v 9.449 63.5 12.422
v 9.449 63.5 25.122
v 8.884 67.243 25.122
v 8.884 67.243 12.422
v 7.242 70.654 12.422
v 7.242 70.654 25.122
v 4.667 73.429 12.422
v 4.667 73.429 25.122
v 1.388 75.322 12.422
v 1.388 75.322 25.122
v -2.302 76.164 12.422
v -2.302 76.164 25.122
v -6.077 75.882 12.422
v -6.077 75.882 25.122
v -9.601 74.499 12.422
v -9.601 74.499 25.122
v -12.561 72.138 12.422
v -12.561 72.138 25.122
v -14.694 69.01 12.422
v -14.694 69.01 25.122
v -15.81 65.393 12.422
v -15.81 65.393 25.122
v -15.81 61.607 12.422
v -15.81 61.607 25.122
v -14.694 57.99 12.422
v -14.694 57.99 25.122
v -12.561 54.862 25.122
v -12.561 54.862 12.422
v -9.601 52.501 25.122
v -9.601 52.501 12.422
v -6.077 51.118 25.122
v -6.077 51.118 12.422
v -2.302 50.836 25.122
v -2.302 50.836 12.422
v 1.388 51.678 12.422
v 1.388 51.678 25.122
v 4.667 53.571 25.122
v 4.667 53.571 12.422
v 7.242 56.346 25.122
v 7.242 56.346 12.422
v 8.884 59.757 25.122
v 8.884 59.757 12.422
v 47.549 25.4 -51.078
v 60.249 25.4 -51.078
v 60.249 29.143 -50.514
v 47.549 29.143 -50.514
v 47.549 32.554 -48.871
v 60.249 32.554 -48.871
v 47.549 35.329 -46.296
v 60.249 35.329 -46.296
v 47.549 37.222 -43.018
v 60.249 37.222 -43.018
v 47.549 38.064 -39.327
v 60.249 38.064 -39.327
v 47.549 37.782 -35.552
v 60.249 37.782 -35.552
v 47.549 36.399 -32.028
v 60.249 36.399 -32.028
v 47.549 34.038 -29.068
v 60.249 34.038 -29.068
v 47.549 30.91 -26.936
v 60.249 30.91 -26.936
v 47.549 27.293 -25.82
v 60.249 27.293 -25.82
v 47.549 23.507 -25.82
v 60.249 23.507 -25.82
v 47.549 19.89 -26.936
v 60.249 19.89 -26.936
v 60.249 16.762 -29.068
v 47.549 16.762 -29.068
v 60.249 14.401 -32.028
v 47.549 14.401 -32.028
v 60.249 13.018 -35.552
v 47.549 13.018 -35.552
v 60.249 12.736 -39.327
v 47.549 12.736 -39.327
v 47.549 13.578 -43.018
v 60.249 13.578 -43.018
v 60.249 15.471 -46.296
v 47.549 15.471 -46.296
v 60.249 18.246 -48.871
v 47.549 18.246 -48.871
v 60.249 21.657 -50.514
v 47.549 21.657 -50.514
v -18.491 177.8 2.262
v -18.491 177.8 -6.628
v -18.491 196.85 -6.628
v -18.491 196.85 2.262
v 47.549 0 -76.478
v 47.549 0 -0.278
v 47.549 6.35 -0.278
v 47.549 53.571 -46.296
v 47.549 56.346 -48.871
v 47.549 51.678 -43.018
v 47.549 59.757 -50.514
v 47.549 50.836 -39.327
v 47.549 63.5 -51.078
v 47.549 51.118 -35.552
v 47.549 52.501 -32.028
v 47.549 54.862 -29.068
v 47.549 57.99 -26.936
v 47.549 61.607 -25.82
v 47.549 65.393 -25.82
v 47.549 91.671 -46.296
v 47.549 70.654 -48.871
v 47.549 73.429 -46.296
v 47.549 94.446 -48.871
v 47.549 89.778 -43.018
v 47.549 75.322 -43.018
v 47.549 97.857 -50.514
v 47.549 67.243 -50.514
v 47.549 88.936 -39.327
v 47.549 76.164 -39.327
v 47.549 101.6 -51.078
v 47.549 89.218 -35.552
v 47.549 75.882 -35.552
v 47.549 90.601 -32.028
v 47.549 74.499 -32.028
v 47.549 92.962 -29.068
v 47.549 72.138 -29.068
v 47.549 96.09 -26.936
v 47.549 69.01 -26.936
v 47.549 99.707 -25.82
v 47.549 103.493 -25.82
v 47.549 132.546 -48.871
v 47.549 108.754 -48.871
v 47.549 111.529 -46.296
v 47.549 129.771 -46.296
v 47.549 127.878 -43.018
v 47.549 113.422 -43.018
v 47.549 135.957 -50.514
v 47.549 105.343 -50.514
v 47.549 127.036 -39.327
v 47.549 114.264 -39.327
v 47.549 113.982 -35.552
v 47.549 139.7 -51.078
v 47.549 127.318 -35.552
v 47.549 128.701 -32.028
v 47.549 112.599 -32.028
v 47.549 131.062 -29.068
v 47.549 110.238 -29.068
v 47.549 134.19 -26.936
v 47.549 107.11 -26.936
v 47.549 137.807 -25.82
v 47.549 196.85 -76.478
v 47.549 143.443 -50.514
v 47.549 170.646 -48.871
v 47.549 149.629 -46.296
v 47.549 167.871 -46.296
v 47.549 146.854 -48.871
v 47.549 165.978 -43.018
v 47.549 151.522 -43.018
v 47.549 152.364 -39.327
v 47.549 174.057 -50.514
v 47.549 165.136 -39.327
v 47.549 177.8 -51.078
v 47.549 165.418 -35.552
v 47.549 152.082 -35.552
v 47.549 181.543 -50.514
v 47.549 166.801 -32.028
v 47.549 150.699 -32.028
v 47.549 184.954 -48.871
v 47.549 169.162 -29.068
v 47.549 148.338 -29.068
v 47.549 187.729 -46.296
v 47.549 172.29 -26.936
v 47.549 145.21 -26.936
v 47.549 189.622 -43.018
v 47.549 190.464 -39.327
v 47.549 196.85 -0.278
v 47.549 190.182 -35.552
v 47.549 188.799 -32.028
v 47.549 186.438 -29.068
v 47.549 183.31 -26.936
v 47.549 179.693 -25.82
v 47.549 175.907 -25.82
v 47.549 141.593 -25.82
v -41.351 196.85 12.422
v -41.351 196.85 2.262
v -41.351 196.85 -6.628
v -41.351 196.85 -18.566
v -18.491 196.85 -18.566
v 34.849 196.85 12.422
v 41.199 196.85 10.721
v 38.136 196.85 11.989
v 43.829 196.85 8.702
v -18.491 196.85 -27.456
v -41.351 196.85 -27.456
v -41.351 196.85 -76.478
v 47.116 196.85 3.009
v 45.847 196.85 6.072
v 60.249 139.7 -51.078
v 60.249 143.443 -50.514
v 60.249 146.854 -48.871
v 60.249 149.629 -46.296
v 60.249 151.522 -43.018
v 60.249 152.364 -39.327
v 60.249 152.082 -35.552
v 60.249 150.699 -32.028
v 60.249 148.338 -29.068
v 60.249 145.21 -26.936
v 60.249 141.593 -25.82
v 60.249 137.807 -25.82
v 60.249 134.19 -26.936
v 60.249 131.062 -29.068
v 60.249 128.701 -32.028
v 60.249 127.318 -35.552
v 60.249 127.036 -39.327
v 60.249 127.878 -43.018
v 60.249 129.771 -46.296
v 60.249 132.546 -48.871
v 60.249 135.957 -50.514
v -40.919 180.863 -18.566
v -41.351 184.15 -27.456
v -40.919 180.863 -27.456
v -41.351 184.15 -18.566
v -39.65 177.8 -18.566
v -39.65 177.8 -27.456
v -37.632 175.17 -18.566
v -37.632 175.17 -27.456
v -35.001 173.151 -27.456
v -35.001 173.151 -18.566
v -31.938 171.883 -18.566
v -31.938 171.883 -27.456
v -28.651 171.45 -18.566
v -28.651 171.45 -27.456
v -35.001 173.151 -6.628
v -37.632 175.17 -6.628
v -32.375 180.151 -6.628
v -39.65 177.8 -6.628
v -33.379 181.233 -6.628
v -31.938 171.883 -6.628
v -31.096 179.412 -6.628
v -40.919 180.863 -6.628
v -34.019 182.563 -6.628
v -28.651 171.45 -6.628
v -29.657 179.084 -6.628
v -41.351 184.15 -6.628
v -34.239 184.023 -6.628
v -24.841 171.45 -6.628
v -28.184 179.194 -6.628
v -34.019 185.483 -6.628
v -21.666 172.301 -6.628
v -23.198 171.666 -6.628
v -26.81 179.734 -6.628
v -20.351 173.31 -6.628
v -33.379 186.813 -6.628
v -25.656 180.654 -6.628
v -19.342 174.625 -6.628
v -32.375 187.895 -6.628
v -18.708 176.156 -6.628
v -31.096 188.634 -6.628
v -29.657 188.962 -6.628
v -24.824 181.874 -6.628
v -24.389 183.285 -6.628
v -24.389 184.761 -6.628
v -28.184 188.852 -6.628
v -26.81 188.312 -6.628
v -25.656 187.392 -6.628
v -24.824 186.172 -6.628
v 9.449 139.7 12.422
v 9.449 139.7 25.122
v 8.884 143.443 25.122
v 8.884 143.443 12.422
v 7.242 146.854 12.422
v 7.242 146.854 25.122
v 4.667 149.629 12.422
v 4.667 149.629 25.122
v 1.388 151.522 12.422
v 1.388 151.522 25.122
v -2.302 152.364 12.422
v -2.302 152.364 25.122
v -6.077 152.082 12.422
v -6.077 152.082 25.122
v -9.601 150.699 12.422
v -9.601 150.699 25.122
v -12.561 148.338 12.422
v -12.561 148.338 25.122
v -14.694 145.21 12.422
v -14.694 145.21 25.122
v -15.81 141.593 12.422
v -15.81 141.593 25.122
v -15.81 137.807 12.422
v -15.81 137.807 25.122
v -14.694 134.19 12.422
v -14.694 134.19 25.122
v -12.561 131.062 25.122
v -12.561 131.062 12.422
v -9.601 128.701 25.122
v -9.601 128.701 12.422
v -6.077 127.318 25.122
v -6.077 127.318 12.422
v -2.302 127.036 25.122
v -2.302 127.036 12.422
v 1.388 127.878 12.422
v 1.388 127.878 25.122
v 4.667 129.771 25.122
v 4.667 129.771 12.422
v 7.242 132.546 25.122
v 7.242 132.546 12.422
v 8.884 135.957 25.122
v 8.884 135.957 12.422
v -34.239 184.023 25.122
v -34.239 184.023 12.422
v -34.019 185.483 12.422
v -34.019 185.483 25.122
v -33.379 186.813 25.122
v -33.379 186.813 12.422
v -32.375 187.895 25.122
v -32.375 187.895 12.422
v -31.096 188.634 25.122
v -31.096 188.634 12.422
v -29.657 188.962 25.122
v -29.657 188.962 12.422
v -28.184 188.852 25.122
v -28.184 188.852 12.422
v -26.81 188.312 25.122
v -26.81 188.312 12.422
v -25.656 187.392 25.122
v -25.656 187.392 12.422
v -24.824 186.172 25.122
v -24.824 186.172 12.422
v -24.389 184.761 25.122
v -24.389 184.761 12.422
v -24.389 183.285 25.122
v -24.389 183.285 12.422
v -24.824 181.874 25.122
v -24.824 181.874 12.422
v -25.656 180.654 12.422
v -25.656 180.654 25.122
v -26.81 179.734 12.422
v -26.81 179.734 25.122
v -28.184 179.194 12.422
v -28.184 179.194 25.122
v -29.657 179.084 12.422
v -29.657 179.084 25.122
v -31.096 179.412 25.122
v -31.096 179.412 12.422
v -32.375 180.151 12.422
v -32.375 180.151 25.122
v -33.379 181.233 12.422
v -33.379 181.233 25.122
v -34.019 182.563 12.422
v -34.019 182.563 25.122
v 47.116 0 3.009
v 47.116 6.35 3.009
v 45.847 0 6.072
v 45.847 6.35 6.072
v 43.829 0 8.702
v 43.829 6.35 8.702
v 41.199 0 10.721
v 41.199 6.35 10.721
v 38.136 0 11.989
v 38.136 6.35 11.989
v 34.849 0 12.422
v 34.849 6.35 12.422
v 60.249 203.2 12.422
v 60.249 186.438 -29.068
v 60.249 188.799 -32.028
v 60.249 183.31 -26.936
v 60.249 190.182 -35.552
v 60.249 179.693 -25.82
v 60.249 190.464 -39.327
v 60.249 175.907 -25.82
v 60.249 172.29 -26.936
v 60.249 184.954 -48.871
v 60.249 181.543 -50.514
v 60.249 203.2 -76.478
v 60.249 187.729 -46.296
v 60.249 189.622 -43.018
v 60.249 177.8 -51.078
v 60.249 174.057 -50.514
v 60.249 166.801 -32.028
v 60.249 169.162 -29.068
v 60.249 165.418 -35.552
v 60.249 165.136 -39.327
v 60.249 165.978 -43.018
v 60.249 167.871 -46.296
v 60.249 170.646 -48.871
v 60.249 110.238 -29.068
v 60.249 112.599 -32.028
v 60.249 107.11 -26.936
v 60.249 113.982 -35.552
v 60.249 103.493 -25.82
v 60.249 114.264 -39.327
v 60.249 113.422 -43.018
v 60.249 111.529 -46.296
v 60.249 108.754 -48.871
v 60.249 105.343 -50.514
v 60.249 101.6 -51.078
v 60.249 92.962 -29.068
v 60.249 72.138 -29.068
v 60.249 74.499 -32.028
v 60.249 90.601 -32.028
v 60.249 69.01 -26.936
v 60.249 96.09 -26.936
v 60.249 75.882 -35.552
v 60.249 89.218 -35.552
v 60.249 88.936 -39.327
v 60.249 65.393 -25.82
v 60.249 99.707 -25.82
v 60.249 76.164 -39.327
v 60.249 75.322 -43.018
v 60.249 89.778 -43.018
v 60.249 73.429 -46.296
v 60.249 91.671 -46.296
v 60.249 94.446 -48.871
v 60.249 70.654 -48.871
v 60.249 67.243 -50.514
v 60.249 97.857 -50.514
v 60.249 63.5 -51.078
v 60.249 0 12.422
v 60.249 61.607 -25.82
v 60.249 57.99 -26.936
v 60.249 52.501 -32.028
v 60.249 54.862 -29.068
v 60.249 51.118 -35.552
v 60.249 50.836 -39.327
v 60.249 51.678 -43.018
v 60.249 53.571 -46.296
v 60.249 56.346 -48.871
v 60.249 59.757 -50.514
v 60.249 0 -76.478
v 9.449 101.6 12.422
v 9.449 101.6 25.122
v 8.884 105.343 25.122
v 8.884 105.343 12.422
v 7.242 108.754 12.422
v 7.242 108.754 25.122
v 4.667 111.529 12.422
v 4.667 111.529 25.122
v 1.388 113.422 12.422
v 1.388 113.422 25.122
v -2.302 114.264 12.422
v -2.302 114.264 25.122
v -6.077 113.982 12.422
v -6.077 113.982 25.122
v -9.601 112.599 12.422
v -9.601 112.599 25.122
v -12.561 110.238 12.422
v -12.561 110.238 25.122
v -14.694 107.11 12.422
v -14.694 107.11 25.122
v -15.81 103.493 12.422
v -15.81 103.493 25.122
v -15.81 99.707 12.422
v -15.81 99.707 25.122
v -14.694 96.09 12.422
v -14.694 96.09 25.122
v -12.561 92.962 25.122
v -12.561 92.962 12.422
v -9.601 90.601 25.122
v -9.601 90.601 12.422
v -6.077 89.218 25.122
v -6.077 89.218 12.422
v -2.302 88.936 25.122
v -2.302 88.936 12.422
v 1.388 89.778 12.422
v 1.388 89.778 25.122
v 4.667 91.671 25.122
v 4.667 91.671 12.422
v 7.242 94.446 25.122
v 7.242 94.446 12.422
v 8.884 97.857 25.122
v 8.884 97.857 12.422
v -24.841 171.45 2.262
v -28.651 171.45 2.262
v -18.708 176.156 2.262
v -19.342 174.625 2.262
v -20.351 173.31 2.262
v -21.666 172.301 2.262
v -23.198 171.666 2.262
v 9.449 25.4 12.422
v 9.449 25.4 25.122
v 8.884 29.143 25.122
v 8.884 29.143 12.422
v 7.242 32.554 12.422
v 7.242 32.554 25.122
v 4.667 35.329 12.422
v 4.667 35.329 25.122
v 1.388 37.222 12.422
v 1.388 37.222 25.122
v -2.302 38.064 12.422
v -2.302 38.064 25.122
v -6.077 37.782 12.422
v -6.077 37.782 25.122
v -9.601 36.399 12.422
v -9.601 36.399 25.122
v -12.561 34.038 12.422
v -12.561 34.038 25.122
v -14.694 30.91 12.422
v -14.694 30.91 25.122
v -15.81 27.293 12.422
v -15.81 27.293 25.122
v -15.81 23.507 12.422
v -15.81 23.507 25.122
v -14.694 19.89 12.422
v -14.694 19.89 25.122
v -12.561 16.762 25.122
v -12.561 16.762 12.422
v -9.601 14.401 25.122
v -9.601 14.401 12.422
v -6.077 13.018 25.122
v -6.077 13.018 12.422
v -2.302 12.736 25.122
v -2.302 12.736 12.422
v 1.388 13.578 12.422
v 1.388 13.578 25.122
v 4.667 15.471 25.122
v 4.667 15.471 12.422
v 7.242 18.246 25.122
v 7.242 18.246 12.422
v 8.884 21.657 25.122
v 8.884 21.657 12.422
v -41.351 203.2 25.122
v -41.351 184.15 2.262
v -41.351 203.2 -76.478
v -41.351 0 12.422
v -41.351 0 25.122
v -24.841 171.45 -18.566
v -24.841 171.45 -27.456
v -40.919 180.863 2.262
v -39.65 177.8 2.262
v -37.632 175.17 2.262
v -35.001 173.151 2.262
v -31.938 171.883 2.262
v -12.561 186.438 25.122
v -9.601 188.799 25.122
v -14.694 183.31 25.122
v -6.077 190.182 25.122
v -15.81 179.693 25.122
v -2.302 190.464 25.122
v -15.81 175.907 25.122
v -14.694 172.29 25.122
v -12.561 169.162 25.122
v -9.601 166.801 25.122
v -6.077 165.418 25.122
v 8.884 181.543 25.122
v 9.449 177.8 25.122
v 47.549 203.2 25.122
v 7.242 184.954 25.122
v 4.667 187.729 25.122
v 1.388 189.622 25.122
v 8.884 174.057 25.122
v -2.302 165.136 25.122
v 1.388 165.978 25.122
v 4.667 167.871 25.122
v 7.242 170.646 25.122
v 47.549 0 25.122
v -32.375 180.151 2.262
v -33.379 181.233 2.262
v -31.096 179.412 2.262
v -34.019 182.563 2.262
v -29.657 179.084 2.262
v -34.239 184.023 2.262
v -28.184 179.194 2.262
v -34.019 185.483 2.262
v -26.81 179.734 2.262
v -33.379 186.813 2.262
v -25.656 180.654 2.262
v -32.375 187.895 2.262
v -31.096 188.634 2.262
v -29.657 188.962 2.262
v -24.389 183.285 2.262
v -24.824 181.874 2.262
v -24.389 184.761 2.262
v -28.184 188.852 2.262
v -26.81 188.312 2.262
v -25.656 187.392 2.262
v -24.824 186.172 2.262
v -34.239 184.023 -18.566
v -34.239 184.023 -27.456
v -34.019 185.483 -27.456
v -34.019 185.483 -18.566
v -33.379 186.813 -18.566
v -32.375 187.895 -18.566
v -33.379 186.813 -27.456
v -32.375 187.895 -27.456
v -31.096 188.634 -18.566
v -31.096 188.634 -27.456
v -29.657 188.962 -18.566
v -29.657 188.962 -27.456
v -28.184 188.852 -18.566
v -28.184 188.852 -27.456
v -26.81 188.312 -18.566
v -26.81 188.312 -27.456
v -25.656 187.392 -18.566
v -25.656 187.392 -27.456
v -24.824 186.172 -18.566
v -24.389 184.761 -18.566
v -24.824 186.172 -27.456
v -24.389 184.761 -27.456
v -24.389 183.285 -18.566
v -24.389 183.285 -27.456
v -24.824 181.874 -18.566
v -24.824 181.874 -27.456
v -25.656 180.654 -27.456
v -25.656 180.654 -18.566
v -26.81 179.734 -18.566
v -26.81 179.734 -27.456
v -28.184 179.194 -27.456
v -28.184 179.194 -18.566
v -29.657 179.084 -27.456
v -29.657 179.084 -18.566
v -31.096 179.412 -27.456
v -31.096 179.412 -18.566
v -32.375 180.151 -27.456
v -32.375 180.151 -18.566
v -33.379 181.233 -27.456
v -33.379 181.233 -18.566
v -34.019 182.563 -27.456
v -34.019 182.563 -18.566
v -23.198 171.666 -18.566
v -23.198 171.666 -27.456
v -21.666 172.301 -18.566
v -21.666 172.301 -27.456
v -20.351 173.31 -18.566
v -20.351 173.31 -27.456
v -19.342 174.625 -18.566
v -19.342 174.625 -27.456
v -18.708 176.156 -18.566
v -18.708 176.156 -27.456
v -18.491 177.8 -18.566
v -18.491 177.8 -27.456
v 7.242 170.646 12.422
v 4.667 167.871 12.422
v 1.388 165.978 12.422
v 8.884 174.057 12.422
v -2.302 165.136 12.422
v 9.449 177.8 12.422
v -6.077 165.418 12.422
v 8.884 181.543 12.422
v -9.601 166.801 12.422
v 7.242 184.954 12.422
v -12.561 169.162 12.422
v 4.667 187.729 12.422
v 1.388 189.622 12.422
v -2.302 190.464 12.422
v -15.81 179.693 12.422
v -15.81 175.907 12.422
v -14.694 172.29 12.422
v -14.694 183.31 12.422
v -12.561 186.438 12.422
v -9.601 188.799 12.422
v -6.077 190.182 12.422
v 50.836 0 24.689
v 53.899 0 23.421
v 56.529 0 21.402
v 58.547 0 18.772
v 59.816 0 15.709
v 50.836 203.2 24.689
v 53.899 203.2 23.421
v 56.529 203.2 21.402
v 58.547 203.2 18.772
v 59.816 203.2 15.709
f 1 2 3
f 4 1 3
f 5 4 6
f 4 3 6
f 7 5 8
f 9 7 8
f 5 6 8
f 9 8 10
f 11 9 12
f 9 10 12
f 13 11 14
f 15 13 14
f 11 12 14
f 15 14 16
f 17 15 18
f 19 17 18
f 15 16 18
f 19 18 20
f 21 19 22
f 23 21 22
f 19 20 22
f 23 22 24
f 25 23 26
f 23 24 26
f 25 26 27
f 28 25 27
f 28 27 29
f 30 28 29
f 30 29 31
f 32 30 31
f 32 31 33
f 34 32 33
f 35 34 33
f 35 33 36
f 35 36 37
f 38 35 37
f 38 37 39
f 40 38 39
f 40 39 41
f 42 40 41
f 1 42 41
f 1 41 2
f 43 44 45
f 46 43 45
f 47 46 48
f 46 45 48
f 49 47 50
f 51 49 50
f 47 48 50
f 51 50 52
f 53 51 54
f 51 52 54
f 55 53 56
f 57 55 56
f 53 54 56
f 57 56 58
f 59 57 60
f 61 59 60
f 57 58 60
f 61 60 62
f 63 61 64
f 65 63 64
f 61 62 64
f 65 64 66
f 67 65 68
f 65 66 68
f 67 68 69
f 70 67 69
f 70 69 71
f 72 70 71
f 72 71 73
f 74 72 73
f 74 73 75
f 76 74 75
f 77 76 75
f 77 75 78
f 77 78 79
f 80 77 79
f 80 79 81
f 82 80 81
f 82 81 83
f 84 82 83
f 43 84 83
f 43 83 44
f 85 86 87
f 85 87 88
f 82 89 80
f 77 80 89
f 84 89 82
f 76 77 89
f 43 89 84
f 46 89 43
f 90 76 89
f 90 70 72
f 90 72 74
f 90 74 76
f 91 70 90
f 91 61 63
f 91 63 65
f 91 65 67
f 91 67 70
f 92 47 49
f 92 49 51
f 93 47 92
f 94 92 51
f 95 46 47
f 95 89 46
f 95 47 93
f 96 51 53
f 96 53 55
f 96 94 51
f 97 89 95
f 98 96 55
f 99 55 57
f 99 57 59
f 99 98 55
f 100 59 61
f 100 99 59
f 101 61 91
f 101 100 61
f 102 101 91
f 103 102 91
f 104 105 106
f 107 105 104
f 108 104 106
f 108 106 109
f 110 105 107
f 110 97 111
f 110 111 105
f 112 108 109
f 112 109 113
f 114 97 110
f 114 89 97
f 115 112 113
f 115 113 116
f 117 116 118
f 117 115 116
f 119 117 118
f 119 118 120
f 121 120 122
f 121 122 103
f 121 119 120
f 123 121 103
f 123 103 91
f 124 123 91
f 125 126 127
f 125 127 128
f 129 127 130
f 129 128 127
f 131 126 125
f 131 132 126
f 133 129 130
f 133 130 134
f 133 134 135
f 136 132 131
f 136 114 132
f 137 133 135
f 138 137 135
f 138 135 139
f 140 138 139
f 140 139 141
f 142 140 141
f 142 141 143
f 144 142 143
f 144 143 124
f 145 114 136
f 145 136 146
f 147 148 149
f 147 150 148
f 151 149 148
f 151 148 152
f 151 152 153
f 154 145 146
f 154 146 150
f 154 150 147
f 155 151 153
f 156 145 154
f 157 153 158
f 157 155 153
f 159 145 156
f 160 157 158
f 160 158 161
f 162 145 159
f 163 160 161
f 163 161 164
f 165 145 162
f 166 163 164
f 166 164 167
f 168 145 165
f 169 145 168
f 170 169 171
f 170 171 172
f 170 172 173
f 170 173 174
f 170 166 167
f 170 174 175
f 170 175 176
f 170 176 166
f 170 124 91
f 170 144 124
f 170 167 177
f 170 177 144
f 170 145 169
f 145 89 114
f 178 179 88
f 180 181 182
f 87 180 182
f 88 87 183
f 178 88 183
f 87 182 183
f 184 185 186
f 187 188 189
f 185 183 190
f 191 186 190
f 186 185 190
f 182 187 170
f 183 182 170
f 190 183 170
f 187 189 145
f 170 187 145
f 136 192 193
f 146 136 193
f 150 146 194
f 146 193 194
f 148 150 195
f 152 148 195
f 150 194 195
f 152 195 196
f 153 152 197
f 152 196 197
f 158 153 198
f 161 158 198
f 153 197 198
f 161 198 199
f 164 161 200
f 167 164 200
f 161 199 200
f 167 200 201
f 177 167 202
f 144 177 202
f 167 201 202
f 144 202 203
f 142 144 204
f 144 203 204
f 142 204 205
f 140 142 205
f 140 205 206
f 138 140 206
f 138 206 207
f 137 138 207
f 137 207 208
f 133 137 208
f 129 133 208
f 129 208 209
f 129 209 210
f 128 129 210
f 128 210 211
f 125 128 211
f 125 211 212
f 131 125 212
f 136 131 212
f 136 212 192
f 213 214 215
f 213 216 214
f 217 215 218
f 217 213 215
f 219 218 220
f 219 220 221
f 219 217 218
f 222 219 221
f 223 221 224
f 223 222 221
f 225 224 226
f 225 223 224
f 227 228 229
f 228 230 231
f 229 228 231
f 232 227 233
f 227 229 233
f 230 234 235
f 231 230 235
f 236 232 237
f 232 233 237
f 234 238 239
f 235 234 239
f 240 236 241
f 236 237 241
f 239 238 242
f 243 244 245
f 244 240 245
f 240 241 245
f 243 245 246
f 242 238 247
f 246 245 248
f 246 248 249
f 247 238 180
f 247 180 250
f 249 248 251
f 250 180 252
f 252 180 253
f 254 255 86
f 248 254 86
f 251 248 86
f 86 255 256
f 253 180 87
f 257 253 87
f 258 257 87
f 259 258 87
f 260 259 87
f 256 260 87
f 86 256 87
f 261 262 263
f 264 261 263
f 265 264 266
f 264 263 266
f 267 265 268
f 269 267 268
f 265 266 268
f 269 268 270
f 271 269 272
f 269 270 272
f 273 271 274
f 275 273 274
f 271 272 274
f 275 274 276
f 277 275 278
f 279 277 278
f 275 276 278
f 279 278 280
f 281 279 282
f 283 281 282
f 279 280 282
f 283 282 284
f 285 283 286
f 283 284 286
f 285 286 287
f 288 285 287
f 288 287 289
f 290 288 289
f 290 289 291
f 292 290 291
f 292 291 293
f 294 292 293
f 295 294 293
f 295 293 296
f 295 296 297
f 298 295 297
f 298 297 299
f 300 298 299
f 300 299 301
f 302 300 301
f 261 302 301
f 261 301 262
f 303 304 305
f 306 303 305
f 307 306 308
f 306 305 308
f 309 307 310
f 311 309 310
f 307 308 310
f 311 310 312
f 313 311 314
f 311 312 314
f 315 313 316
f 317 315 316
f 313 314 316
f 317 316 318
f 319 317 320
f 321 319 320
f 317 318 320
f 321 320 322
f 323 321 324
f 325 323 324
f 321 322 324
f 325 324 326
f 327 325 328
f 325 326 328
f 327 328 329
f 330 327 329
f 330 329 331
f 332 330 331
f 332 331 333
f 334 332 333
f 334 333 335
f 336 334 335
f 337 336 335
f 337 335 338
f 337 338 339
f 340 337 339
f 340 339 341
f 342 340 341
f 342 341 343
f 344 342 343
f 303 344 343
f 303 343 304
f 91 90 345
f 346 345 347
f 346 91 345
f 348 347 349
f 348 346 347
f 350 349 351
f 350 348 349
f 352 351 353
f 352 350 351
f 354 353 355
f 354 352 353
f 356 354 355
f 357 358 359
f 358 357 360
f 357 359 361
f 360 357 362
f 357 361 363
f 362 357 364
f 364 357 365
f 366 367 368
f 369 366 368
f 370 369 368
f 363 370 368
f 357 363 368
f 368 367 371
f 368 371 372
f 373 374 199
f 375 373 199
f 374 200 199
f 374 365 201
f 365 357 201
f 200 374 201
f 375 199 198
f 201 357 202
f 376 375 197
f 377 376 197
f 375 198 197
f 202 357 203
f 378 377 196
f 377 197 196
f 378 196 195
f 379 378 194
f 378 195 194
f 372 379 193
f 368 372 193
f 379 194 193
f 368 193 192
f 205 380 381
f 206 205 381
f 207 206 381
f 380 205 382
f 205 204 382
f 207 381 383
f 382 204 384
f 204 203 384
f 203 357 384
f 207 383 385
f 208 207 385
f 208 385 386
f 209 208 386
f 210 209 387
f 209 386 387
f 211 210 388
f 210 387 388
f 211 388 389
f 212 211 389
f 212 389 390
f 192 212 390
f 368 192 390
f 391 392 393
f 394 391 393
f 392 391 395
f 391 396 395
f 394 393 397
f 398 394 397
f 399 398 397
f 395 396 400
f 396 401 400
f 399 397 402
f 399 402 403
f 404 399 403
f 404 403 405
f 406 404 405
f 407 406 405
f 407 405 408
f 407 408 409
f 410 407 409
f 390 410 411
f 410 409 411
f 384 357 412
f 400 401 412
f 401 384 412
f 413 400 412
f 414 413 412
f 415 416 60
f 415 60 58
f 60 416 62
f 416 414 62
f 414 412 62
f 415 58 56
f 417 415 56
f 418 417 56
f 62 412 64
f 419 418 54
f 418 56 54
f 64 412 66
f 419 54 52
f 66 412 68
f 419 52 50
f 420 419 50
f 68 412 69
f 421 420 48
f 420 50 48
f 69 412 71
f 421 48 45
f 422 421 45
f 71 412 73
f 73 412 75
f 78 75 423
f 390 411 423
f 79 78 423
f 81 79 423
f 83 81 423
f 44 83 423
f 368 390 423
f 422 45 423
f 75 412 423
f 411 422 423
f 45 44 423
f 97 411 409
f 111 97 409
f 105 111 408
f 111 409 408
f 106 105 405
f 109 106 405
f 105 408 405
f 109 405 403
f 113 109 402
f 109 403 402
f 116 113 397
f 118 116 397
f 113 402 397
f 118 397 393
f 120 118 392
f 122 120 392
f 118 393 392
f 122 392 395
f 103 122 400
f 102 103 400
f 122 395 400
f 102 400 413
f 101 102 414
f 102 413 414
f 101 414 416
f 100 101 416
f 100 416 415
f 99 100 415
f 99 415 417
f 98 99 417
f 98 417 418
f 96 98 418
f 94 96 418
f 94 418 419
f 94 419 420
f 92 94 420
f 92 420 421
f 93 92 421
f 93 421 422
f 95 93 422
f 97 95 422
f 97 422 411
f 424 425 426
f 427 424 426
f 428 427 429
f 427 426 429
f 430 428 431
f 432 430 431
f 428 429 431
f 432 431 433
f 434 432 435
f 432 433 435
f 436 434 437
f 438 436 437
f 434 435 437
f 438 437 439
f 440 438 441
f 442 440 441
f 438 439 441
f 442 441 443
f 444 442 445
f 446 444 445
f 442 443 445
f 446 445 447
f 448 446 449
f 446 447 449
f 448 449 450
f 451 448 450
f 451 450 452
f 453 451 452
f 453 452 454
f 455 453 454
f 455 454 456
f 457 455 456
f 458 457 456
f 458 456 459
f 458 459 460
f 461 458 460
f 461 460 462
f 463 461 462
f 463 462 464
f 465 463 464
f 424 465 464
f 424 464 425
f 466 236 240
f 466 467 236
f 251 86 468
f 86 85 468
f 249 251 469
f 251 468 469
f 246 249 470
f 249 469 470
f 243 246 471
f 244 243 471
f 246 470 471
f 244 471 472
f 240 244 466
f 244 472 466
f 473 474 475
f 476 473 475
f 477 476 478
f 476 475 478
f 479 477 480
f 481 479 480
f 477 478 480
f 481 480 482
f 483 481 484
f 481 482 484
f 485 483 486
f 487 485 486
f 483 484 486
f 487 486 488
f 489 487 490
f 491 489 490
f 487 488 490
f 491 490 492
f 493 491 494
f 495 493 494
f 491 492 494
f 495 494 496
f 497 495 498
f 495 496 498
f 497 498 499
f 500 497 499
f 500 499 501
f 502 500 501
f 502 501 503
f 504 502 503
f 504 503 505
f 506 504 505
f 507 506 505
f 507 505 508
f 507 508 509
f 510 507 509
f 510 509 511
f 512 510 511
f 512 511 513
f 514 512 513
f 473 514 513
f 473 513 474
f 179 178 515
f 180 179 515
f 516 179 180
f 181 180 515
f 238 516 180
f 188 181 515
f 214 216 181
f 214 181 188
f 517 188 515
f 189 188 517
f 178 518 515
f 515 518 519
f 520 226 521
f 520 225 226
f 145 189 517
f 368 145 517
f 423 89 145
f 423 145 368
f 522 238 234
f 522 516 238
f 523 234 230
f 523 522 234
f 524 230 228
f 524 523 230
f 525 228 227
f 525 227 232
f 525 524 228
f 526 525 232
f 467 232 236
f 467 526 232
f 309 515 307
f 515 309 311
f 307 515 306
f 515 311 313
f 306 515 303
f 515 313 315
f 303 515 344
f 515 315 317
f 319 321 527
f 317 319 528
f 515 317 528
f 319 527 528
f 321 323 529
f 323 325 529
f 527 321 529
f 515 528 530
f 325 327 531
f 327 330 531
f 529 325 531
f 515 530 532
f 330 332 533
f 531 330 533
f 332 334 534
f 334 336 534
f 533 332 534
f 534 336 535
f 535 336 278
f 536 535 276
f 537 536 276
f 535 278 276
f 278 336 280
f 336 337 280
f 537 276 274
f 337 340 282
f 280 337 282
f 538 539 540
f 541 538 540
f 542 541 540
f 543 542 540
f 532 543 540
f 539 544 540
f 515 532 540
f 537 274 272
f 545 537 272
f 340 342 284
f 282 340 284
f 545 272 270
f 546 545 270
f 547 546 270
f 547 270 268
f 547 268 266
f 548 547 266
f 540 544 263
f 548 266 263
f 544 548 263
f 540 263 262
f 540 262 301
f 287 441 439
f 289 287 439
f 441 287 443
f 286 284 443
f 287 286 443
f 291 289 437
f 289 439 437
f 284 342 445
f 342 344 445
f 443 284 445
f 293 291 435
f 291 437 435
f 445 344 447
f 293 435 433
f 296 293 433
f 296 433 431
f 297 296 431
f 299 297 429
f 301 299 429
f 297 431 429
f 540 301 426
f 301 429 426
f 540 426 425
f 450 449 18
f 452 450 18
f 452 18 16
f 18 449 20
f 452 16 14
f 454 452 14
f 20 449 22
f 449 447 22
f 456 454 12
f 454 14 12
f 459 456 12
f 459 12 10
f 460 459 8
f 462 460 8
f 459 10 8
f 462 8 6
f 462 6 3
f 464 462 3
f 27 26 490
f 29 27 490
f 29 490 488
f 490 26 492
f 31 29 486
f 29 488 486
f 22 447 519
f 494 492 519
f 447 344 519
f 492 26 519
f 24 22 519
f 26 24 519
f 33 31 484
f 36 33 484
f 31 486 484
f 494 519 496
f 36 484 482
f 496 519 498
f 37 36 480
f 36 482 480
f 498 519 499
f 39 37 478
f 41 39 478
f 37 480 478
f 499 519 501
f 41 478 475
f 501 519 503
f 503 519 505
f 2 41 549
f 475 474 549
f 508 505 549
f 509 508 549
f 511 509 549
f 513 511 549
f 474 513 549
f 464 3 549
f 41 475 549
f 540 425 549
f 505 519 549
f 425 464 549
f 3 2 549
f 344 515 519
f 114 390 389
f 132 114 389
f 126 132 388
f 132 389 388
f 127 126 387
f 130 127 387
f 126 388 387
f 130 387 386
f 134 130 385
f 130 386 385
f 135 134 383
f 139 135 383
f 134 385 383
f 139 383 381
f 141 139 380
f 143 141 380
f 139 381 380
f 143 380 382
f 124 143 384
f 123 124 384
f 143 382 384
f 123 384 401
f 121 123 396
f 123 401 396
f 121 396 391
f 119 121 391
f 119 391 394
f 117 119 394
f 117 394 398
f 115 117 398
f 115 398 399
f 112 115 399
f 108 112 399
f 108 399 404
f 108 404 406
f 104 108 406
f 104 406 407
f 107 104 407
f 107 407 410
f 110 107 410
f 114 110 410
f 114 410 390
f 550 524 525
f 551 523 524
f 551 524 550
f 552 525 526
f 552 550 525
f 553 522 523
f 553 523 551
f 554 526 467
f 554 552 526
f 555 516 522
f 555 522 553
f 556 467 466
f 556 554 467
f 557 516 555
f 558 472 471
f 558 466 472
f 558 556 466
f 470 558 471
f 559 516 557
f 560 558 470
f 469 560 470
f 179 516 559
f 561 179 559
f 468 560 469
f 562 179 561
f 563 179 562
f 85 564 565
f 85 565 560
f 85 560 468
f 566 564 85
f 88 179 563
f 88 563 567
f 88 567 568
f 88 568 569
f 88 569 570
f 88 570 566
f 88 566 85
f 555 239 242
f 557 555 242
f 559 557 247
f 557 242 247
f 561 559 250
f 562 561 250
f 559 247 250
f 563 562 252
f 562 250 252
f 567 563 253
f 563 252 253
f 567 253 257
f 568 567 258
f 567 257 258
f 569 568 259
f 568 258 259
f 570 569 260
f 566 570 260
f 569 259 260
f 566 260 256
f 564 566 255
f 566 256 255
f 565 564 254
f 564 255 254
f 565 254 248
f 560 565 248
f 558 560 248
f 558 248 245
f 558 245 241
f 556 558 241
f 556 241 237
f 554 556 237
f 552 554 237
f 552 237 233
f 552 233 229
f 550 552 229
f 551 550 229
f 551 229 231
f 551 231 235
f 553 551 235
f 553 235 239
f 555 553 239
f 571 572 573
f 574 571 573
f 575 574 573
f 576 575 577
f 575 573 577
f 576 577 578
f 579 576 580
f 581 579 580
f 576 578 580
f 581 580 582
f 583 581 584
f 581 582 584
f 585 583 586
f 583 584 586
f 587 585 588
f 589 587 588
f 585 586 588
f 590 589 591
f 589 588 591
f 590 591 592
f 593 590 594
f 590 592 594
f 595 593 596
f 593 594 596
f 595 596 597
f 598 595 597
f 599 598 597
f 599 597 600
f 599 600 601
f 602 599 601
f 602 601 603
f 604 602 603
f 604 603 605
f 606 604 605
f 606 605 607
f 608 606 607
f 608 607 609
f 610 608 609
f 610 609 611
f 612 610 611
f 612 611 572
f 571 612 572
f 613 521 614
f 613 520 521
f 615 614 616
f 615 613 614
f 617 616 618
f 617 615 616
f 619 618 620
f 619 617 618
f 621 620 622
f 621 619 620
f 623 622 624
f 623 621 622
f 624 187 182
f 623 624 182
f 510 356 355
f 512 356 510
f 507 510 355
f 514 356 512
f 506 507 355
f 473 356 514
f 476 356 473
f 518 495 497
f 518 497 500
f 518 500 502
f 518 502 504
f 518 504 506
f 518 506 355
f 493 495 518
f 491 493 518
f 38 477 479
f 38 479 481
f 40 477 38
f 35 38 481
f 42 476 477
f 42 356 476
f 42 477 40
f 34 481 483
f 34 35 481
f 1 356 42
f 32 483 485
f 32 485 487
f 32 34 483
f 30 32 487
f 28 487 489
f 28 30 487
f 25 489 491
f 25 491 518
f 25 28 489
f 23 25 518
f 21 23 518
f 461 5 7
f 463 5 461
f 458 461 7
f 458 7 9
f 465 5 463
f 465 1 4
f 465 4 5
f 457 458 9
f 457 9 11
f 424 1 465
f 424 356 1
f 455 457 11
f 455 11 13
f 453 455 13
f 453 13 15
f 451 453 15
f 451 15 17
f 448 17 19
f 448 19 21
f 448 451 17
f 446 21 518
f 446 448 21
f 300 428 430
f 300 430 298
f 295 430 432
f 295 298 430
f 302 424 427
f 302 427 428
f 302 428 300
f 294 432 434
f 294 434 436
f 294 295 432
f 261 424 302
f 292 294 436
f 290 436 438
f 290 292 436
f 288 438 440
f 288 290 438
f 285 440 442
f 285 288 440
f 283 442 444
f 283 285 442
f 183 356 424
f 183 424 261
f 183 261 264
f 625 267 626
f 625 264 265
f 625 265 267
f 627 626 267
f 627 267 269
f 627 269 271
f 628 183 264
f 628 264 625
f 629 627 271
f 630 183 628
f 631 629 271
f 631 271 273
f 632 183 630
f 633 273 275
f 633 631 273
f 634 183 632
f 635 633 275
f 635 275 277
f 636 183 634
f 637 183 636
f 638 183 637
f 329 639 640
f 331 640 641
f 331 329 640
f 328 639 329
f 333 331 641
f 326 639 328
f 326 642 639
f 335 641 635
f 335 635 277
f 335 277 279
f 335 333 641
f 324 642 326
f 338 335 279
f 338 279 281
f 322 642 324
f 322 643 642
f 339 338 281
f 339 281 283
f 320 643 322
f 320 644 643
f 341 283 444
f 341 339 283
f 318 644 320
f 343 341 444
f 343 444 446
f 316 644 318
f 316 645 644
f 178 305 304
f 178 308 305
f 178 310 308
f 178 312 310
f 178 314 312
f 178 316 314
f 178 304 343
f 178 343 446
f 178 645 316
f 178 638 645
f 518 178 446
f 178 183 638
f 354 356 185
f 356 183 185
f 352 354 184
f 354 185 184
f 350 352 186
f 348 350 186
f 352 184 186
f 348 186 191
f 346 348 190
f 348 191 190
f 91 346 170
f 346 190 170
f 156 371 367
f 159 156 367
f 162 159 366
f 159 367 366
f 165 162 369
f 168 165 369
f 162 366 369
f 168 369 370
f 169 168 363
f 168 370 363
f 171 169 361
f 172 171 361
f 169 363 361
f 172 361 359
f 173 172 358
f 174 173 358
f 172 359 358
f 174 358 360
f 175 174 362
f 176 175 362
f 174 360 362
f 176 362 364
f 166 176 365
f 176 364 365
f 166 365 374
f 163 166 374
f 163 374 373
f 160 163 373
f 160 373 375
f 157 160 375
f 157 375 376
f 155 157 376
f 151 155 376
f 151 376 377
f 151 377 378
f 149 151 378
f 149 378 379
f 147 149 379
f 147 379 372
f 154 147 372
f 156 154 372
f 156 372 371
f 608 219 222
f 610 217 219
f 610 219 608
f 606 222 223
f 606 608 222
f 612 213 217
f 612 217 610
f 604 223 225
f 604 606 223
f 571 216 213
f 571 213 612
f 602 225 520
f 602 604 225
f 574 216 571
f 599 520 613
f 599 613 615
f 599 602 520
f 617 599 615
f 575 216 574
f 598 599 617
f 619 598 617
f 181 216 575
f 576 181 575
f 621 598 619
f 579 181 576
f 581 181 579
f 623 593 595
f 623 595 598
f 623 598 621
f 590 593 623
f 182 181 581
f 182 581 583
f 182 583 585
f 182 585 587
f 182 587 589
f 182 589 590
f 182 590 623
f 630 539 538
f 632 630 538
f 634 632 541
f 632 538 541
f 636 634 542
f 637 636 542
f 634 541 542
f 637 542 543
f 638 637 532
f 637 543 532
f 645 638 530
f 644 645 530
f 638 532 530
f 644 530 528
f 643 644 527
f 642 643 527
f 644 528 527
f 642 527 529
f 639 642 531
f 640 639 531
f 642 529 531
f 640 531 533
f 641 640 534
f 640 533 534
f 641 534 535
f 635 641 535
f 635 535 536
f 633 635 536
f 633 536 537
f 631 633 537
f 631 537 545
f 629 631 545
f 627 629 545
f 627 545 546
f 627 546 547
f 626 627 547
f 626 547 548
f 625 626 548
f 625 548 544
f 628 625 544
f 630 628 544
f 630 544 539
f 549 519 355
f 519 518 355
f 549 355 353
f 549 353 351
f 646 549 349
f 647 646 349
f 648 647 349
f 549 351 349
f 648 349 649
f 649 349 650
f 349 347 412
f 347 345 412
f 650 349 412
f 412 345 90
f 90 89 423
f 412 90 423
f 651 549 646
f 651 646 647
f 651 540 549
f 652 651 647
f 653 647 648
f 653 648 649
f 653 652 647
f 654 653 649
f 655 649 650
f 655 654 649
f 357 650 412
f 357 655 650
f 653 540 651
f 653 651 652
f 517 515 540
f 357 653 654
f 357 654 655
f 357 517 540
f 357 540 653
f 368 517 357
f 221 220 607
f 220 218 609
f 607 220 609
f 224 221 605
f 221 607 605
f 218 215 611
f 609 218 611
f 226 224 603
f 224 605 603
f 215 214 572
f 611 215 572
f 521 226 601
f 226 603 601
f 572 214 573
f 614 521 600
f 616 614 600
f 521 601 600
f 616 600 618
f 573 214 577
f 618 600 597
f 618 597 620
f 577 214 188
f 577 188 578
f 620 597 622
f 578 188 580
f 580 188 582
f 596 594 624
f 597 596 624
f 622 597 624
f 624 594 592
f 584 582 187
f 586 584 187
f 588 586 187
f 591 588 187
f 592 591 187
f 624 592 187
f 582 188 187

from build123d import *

# Parameters (mm, degrees)
SKETCH2_W               = 101.6
SKETCH2_H               = 101.6
BOSS_EXTRUDE1_DEPTH     = 203.2
SKETCH4_W               = 88.9
SKETCH4_H               = 88.9
CUT_EXTRUDE1_DEPTH      = 95.25
FILLET1_R               = 12.7
SKETCH5_R               = 12.7
CUT_EXTRUDE2_DEPTH      = 102.6
SKETCH6_R               = 12.7
CUT_EXTRUDE3_DEPTH      = 102.6
CUT_EXTRUDE4_DEPTH      = 7.35
SKETCH31_W              = 22.86
SKETCH31_H              = 8.89
BOSS_EXTRUDE2_DEPTH     = 25.4
FILLET5_R               = 12.7
FILLET6_R               = 6.35
SKETCH38_R              = 4.953
CUT_EXTRUDE7_DEPTH      = 50.022
CUT_EXTRUDE7_DEPTH_BACK = 53.578


with BuildPart() as part:
    # Sketch2 → Boss-Extrude1 (new body)
    with BuildSketch(Plane(origin=(0, 0, 0), x_dir=(1, 0, 0), z_dir=(0, 1, 0))):
        with Locations((9.448577681, 25.677899344)):
            Rectangle(SKETCH2_W, SKETCH2_H)
    extrude(amount=BOSS_EXTRUDE1_DEPTH)

    # Sketch4 → Cut-Extrude1 (cut, symmetric)
    with BuildSketch(Plane(origin=(0, 101.6, 0), x_dir=(1, 0, 0), z_dir=(0, 1, 0))):
        with Locations((3.098577681, 32.027899344)):
            Rectangle(SKETCH4_W, SKETCH4_H)
    extrude(amount=CUT_EXTRUDE1_DEPTH, both=True, mode=Mode.SUBTRACT)

    # Fillet1
    fillet1_edges = [part.edges().sort_by_distance(p)[0] for p in [
        (47.548577681, 101.6, 12.422100656),
        (60.248577681, 101.6, 25.122100656),
    ]]
    fillet(fillet1_edges, radius=FILLET1_R)

    # Sketch5 → Cut-Extrude2 (cut, through all)
    with BuildSketch(Plane.XY.offset(25.122100656)):
        with Locations((-3.251422319, 177.8)):
            Circle(SKETCH5_R)
        with Locations((-3.251422319, 139.7)):
            Circle(SKETCH5_R)
        with Locations((-3.251422319, 101.6)):
            Circle(SKETCH5_R)
        with Locations((-3.251422319, 63.5)):
            Circle(SKETCH5_R)
        with Locations((-3.251422319, 25.4)):
            Circle(SKETCH5_R)
    extrude(amount=-CUT_EXTRUDE2_DEPTH, mode=Mode.SUBTRACT)

    # Sketch6 → Cut-Extrude3 (cut, through all)
    with BuildSketch(Plane(origin=(60.248577681, 0, 0), x_dir=(0, 0, -1), z_dir=(1, 0, 0))):
        with Locations((38.377899344, 177.8)):
            Circle(SKETCH6_R)
        with Locations((38.377899344, 139.7)):
            Circle(SKETCH6_R)
        with Locations((38.377899344, 101.6)):
            Circle(SKETCH6_R)
        with Locations((38.377899344, 63.5)):
            Circle(SKETCH6_R)
        with Locations((38.377899344, 25.4)):
            Circle(SKETCH6_R)
    extrude(amount=-CUT_EXTRUDE3_DEPTH, mode=Mode.SUBTRACT)

    # Sketch7 → Cut-Extrude4 (cut, through all)
    with BuildSketch(Plane(origin=(0, 6.35, 0), x_dir=(1, 0, 0), z_dir=(0, 1, 0))):
        with BuildLine():
            Line((-41.351422319, 76.477899344), (47.548577681, 76.477899344))
            Line((47.548577681, 76.477899344), (47.548577681, 0.277899344))
            ThreePointArc((47.548577681, 0.277899344), (43.828833802, -8.702356778), (34.848577681, -12.422100656))
            Line((34.848577681, -12.422100656), (-41.351422319, -12.422100656))
            Line((-41.351422319, -12.422100656), (-41.351422319, 76.477899344))
        make_face()
    extrude(amount=-CUT_EXTRUDE4_DEPTH, mode=Mode.SUBTRACT)

    # Sketch31 → Boss-Extrude2 (add)
    with BuildSketch(Plane.XZ.offset(-196.85)):
        with Locations((-29.921422319, -2.182899344)):
            Rectangle(SKETCH31_W, SKETCH31_H)
        with Locations((-29.921422319, -23.010899344)):
            Rectangle(SKETCH31_W, SKETCH31_H)
    extrude(amount=BOSS_EXTRUDE2_DEPTH)

    # Fillet5
    fillet5_edges = [part.edges().sort_by_distance(p)[0] for p in [
        (-41.351422319, 171.45, -2.182899344),
        (-41.351422319, 171.45, -23.010899344),
    ]]
    fillet(fillet5_edges, radius=FILLET5_R)

    # Fillet6
    fillet6_edges = [part.edges().sort_by_distance(p)[0] for p in [
        (-18.491422319, 171.45, -2.182899344),
        (-18.491422319, 171.45, -23.010899344),
    ]]
    fillet(fillet6_edges, radius=FILLET6_R)

    # Sketch38 → Cut-Extrude7 (cut, two sides)
    with BuildSketch(Plane(origin=(0, 0, -27.455899344), x_dir=(-1, 0, 0), z_dir=(0, 0, -1))) as cut_extrude7_sk:
        with Locations((29.286422319, 184.023)):
            Circle(SKETCH38_R)
    extrude(amount=CUT_EXTRUDE7_DEPTH, mode=Mode.SUBTRACT)
    extrude(cut_extrude7_sk.sketch, amount=-CUT_EXTRUDE7_DEPTH_BACK, mode=Mode.SUBTRACT)


solid = part.part
